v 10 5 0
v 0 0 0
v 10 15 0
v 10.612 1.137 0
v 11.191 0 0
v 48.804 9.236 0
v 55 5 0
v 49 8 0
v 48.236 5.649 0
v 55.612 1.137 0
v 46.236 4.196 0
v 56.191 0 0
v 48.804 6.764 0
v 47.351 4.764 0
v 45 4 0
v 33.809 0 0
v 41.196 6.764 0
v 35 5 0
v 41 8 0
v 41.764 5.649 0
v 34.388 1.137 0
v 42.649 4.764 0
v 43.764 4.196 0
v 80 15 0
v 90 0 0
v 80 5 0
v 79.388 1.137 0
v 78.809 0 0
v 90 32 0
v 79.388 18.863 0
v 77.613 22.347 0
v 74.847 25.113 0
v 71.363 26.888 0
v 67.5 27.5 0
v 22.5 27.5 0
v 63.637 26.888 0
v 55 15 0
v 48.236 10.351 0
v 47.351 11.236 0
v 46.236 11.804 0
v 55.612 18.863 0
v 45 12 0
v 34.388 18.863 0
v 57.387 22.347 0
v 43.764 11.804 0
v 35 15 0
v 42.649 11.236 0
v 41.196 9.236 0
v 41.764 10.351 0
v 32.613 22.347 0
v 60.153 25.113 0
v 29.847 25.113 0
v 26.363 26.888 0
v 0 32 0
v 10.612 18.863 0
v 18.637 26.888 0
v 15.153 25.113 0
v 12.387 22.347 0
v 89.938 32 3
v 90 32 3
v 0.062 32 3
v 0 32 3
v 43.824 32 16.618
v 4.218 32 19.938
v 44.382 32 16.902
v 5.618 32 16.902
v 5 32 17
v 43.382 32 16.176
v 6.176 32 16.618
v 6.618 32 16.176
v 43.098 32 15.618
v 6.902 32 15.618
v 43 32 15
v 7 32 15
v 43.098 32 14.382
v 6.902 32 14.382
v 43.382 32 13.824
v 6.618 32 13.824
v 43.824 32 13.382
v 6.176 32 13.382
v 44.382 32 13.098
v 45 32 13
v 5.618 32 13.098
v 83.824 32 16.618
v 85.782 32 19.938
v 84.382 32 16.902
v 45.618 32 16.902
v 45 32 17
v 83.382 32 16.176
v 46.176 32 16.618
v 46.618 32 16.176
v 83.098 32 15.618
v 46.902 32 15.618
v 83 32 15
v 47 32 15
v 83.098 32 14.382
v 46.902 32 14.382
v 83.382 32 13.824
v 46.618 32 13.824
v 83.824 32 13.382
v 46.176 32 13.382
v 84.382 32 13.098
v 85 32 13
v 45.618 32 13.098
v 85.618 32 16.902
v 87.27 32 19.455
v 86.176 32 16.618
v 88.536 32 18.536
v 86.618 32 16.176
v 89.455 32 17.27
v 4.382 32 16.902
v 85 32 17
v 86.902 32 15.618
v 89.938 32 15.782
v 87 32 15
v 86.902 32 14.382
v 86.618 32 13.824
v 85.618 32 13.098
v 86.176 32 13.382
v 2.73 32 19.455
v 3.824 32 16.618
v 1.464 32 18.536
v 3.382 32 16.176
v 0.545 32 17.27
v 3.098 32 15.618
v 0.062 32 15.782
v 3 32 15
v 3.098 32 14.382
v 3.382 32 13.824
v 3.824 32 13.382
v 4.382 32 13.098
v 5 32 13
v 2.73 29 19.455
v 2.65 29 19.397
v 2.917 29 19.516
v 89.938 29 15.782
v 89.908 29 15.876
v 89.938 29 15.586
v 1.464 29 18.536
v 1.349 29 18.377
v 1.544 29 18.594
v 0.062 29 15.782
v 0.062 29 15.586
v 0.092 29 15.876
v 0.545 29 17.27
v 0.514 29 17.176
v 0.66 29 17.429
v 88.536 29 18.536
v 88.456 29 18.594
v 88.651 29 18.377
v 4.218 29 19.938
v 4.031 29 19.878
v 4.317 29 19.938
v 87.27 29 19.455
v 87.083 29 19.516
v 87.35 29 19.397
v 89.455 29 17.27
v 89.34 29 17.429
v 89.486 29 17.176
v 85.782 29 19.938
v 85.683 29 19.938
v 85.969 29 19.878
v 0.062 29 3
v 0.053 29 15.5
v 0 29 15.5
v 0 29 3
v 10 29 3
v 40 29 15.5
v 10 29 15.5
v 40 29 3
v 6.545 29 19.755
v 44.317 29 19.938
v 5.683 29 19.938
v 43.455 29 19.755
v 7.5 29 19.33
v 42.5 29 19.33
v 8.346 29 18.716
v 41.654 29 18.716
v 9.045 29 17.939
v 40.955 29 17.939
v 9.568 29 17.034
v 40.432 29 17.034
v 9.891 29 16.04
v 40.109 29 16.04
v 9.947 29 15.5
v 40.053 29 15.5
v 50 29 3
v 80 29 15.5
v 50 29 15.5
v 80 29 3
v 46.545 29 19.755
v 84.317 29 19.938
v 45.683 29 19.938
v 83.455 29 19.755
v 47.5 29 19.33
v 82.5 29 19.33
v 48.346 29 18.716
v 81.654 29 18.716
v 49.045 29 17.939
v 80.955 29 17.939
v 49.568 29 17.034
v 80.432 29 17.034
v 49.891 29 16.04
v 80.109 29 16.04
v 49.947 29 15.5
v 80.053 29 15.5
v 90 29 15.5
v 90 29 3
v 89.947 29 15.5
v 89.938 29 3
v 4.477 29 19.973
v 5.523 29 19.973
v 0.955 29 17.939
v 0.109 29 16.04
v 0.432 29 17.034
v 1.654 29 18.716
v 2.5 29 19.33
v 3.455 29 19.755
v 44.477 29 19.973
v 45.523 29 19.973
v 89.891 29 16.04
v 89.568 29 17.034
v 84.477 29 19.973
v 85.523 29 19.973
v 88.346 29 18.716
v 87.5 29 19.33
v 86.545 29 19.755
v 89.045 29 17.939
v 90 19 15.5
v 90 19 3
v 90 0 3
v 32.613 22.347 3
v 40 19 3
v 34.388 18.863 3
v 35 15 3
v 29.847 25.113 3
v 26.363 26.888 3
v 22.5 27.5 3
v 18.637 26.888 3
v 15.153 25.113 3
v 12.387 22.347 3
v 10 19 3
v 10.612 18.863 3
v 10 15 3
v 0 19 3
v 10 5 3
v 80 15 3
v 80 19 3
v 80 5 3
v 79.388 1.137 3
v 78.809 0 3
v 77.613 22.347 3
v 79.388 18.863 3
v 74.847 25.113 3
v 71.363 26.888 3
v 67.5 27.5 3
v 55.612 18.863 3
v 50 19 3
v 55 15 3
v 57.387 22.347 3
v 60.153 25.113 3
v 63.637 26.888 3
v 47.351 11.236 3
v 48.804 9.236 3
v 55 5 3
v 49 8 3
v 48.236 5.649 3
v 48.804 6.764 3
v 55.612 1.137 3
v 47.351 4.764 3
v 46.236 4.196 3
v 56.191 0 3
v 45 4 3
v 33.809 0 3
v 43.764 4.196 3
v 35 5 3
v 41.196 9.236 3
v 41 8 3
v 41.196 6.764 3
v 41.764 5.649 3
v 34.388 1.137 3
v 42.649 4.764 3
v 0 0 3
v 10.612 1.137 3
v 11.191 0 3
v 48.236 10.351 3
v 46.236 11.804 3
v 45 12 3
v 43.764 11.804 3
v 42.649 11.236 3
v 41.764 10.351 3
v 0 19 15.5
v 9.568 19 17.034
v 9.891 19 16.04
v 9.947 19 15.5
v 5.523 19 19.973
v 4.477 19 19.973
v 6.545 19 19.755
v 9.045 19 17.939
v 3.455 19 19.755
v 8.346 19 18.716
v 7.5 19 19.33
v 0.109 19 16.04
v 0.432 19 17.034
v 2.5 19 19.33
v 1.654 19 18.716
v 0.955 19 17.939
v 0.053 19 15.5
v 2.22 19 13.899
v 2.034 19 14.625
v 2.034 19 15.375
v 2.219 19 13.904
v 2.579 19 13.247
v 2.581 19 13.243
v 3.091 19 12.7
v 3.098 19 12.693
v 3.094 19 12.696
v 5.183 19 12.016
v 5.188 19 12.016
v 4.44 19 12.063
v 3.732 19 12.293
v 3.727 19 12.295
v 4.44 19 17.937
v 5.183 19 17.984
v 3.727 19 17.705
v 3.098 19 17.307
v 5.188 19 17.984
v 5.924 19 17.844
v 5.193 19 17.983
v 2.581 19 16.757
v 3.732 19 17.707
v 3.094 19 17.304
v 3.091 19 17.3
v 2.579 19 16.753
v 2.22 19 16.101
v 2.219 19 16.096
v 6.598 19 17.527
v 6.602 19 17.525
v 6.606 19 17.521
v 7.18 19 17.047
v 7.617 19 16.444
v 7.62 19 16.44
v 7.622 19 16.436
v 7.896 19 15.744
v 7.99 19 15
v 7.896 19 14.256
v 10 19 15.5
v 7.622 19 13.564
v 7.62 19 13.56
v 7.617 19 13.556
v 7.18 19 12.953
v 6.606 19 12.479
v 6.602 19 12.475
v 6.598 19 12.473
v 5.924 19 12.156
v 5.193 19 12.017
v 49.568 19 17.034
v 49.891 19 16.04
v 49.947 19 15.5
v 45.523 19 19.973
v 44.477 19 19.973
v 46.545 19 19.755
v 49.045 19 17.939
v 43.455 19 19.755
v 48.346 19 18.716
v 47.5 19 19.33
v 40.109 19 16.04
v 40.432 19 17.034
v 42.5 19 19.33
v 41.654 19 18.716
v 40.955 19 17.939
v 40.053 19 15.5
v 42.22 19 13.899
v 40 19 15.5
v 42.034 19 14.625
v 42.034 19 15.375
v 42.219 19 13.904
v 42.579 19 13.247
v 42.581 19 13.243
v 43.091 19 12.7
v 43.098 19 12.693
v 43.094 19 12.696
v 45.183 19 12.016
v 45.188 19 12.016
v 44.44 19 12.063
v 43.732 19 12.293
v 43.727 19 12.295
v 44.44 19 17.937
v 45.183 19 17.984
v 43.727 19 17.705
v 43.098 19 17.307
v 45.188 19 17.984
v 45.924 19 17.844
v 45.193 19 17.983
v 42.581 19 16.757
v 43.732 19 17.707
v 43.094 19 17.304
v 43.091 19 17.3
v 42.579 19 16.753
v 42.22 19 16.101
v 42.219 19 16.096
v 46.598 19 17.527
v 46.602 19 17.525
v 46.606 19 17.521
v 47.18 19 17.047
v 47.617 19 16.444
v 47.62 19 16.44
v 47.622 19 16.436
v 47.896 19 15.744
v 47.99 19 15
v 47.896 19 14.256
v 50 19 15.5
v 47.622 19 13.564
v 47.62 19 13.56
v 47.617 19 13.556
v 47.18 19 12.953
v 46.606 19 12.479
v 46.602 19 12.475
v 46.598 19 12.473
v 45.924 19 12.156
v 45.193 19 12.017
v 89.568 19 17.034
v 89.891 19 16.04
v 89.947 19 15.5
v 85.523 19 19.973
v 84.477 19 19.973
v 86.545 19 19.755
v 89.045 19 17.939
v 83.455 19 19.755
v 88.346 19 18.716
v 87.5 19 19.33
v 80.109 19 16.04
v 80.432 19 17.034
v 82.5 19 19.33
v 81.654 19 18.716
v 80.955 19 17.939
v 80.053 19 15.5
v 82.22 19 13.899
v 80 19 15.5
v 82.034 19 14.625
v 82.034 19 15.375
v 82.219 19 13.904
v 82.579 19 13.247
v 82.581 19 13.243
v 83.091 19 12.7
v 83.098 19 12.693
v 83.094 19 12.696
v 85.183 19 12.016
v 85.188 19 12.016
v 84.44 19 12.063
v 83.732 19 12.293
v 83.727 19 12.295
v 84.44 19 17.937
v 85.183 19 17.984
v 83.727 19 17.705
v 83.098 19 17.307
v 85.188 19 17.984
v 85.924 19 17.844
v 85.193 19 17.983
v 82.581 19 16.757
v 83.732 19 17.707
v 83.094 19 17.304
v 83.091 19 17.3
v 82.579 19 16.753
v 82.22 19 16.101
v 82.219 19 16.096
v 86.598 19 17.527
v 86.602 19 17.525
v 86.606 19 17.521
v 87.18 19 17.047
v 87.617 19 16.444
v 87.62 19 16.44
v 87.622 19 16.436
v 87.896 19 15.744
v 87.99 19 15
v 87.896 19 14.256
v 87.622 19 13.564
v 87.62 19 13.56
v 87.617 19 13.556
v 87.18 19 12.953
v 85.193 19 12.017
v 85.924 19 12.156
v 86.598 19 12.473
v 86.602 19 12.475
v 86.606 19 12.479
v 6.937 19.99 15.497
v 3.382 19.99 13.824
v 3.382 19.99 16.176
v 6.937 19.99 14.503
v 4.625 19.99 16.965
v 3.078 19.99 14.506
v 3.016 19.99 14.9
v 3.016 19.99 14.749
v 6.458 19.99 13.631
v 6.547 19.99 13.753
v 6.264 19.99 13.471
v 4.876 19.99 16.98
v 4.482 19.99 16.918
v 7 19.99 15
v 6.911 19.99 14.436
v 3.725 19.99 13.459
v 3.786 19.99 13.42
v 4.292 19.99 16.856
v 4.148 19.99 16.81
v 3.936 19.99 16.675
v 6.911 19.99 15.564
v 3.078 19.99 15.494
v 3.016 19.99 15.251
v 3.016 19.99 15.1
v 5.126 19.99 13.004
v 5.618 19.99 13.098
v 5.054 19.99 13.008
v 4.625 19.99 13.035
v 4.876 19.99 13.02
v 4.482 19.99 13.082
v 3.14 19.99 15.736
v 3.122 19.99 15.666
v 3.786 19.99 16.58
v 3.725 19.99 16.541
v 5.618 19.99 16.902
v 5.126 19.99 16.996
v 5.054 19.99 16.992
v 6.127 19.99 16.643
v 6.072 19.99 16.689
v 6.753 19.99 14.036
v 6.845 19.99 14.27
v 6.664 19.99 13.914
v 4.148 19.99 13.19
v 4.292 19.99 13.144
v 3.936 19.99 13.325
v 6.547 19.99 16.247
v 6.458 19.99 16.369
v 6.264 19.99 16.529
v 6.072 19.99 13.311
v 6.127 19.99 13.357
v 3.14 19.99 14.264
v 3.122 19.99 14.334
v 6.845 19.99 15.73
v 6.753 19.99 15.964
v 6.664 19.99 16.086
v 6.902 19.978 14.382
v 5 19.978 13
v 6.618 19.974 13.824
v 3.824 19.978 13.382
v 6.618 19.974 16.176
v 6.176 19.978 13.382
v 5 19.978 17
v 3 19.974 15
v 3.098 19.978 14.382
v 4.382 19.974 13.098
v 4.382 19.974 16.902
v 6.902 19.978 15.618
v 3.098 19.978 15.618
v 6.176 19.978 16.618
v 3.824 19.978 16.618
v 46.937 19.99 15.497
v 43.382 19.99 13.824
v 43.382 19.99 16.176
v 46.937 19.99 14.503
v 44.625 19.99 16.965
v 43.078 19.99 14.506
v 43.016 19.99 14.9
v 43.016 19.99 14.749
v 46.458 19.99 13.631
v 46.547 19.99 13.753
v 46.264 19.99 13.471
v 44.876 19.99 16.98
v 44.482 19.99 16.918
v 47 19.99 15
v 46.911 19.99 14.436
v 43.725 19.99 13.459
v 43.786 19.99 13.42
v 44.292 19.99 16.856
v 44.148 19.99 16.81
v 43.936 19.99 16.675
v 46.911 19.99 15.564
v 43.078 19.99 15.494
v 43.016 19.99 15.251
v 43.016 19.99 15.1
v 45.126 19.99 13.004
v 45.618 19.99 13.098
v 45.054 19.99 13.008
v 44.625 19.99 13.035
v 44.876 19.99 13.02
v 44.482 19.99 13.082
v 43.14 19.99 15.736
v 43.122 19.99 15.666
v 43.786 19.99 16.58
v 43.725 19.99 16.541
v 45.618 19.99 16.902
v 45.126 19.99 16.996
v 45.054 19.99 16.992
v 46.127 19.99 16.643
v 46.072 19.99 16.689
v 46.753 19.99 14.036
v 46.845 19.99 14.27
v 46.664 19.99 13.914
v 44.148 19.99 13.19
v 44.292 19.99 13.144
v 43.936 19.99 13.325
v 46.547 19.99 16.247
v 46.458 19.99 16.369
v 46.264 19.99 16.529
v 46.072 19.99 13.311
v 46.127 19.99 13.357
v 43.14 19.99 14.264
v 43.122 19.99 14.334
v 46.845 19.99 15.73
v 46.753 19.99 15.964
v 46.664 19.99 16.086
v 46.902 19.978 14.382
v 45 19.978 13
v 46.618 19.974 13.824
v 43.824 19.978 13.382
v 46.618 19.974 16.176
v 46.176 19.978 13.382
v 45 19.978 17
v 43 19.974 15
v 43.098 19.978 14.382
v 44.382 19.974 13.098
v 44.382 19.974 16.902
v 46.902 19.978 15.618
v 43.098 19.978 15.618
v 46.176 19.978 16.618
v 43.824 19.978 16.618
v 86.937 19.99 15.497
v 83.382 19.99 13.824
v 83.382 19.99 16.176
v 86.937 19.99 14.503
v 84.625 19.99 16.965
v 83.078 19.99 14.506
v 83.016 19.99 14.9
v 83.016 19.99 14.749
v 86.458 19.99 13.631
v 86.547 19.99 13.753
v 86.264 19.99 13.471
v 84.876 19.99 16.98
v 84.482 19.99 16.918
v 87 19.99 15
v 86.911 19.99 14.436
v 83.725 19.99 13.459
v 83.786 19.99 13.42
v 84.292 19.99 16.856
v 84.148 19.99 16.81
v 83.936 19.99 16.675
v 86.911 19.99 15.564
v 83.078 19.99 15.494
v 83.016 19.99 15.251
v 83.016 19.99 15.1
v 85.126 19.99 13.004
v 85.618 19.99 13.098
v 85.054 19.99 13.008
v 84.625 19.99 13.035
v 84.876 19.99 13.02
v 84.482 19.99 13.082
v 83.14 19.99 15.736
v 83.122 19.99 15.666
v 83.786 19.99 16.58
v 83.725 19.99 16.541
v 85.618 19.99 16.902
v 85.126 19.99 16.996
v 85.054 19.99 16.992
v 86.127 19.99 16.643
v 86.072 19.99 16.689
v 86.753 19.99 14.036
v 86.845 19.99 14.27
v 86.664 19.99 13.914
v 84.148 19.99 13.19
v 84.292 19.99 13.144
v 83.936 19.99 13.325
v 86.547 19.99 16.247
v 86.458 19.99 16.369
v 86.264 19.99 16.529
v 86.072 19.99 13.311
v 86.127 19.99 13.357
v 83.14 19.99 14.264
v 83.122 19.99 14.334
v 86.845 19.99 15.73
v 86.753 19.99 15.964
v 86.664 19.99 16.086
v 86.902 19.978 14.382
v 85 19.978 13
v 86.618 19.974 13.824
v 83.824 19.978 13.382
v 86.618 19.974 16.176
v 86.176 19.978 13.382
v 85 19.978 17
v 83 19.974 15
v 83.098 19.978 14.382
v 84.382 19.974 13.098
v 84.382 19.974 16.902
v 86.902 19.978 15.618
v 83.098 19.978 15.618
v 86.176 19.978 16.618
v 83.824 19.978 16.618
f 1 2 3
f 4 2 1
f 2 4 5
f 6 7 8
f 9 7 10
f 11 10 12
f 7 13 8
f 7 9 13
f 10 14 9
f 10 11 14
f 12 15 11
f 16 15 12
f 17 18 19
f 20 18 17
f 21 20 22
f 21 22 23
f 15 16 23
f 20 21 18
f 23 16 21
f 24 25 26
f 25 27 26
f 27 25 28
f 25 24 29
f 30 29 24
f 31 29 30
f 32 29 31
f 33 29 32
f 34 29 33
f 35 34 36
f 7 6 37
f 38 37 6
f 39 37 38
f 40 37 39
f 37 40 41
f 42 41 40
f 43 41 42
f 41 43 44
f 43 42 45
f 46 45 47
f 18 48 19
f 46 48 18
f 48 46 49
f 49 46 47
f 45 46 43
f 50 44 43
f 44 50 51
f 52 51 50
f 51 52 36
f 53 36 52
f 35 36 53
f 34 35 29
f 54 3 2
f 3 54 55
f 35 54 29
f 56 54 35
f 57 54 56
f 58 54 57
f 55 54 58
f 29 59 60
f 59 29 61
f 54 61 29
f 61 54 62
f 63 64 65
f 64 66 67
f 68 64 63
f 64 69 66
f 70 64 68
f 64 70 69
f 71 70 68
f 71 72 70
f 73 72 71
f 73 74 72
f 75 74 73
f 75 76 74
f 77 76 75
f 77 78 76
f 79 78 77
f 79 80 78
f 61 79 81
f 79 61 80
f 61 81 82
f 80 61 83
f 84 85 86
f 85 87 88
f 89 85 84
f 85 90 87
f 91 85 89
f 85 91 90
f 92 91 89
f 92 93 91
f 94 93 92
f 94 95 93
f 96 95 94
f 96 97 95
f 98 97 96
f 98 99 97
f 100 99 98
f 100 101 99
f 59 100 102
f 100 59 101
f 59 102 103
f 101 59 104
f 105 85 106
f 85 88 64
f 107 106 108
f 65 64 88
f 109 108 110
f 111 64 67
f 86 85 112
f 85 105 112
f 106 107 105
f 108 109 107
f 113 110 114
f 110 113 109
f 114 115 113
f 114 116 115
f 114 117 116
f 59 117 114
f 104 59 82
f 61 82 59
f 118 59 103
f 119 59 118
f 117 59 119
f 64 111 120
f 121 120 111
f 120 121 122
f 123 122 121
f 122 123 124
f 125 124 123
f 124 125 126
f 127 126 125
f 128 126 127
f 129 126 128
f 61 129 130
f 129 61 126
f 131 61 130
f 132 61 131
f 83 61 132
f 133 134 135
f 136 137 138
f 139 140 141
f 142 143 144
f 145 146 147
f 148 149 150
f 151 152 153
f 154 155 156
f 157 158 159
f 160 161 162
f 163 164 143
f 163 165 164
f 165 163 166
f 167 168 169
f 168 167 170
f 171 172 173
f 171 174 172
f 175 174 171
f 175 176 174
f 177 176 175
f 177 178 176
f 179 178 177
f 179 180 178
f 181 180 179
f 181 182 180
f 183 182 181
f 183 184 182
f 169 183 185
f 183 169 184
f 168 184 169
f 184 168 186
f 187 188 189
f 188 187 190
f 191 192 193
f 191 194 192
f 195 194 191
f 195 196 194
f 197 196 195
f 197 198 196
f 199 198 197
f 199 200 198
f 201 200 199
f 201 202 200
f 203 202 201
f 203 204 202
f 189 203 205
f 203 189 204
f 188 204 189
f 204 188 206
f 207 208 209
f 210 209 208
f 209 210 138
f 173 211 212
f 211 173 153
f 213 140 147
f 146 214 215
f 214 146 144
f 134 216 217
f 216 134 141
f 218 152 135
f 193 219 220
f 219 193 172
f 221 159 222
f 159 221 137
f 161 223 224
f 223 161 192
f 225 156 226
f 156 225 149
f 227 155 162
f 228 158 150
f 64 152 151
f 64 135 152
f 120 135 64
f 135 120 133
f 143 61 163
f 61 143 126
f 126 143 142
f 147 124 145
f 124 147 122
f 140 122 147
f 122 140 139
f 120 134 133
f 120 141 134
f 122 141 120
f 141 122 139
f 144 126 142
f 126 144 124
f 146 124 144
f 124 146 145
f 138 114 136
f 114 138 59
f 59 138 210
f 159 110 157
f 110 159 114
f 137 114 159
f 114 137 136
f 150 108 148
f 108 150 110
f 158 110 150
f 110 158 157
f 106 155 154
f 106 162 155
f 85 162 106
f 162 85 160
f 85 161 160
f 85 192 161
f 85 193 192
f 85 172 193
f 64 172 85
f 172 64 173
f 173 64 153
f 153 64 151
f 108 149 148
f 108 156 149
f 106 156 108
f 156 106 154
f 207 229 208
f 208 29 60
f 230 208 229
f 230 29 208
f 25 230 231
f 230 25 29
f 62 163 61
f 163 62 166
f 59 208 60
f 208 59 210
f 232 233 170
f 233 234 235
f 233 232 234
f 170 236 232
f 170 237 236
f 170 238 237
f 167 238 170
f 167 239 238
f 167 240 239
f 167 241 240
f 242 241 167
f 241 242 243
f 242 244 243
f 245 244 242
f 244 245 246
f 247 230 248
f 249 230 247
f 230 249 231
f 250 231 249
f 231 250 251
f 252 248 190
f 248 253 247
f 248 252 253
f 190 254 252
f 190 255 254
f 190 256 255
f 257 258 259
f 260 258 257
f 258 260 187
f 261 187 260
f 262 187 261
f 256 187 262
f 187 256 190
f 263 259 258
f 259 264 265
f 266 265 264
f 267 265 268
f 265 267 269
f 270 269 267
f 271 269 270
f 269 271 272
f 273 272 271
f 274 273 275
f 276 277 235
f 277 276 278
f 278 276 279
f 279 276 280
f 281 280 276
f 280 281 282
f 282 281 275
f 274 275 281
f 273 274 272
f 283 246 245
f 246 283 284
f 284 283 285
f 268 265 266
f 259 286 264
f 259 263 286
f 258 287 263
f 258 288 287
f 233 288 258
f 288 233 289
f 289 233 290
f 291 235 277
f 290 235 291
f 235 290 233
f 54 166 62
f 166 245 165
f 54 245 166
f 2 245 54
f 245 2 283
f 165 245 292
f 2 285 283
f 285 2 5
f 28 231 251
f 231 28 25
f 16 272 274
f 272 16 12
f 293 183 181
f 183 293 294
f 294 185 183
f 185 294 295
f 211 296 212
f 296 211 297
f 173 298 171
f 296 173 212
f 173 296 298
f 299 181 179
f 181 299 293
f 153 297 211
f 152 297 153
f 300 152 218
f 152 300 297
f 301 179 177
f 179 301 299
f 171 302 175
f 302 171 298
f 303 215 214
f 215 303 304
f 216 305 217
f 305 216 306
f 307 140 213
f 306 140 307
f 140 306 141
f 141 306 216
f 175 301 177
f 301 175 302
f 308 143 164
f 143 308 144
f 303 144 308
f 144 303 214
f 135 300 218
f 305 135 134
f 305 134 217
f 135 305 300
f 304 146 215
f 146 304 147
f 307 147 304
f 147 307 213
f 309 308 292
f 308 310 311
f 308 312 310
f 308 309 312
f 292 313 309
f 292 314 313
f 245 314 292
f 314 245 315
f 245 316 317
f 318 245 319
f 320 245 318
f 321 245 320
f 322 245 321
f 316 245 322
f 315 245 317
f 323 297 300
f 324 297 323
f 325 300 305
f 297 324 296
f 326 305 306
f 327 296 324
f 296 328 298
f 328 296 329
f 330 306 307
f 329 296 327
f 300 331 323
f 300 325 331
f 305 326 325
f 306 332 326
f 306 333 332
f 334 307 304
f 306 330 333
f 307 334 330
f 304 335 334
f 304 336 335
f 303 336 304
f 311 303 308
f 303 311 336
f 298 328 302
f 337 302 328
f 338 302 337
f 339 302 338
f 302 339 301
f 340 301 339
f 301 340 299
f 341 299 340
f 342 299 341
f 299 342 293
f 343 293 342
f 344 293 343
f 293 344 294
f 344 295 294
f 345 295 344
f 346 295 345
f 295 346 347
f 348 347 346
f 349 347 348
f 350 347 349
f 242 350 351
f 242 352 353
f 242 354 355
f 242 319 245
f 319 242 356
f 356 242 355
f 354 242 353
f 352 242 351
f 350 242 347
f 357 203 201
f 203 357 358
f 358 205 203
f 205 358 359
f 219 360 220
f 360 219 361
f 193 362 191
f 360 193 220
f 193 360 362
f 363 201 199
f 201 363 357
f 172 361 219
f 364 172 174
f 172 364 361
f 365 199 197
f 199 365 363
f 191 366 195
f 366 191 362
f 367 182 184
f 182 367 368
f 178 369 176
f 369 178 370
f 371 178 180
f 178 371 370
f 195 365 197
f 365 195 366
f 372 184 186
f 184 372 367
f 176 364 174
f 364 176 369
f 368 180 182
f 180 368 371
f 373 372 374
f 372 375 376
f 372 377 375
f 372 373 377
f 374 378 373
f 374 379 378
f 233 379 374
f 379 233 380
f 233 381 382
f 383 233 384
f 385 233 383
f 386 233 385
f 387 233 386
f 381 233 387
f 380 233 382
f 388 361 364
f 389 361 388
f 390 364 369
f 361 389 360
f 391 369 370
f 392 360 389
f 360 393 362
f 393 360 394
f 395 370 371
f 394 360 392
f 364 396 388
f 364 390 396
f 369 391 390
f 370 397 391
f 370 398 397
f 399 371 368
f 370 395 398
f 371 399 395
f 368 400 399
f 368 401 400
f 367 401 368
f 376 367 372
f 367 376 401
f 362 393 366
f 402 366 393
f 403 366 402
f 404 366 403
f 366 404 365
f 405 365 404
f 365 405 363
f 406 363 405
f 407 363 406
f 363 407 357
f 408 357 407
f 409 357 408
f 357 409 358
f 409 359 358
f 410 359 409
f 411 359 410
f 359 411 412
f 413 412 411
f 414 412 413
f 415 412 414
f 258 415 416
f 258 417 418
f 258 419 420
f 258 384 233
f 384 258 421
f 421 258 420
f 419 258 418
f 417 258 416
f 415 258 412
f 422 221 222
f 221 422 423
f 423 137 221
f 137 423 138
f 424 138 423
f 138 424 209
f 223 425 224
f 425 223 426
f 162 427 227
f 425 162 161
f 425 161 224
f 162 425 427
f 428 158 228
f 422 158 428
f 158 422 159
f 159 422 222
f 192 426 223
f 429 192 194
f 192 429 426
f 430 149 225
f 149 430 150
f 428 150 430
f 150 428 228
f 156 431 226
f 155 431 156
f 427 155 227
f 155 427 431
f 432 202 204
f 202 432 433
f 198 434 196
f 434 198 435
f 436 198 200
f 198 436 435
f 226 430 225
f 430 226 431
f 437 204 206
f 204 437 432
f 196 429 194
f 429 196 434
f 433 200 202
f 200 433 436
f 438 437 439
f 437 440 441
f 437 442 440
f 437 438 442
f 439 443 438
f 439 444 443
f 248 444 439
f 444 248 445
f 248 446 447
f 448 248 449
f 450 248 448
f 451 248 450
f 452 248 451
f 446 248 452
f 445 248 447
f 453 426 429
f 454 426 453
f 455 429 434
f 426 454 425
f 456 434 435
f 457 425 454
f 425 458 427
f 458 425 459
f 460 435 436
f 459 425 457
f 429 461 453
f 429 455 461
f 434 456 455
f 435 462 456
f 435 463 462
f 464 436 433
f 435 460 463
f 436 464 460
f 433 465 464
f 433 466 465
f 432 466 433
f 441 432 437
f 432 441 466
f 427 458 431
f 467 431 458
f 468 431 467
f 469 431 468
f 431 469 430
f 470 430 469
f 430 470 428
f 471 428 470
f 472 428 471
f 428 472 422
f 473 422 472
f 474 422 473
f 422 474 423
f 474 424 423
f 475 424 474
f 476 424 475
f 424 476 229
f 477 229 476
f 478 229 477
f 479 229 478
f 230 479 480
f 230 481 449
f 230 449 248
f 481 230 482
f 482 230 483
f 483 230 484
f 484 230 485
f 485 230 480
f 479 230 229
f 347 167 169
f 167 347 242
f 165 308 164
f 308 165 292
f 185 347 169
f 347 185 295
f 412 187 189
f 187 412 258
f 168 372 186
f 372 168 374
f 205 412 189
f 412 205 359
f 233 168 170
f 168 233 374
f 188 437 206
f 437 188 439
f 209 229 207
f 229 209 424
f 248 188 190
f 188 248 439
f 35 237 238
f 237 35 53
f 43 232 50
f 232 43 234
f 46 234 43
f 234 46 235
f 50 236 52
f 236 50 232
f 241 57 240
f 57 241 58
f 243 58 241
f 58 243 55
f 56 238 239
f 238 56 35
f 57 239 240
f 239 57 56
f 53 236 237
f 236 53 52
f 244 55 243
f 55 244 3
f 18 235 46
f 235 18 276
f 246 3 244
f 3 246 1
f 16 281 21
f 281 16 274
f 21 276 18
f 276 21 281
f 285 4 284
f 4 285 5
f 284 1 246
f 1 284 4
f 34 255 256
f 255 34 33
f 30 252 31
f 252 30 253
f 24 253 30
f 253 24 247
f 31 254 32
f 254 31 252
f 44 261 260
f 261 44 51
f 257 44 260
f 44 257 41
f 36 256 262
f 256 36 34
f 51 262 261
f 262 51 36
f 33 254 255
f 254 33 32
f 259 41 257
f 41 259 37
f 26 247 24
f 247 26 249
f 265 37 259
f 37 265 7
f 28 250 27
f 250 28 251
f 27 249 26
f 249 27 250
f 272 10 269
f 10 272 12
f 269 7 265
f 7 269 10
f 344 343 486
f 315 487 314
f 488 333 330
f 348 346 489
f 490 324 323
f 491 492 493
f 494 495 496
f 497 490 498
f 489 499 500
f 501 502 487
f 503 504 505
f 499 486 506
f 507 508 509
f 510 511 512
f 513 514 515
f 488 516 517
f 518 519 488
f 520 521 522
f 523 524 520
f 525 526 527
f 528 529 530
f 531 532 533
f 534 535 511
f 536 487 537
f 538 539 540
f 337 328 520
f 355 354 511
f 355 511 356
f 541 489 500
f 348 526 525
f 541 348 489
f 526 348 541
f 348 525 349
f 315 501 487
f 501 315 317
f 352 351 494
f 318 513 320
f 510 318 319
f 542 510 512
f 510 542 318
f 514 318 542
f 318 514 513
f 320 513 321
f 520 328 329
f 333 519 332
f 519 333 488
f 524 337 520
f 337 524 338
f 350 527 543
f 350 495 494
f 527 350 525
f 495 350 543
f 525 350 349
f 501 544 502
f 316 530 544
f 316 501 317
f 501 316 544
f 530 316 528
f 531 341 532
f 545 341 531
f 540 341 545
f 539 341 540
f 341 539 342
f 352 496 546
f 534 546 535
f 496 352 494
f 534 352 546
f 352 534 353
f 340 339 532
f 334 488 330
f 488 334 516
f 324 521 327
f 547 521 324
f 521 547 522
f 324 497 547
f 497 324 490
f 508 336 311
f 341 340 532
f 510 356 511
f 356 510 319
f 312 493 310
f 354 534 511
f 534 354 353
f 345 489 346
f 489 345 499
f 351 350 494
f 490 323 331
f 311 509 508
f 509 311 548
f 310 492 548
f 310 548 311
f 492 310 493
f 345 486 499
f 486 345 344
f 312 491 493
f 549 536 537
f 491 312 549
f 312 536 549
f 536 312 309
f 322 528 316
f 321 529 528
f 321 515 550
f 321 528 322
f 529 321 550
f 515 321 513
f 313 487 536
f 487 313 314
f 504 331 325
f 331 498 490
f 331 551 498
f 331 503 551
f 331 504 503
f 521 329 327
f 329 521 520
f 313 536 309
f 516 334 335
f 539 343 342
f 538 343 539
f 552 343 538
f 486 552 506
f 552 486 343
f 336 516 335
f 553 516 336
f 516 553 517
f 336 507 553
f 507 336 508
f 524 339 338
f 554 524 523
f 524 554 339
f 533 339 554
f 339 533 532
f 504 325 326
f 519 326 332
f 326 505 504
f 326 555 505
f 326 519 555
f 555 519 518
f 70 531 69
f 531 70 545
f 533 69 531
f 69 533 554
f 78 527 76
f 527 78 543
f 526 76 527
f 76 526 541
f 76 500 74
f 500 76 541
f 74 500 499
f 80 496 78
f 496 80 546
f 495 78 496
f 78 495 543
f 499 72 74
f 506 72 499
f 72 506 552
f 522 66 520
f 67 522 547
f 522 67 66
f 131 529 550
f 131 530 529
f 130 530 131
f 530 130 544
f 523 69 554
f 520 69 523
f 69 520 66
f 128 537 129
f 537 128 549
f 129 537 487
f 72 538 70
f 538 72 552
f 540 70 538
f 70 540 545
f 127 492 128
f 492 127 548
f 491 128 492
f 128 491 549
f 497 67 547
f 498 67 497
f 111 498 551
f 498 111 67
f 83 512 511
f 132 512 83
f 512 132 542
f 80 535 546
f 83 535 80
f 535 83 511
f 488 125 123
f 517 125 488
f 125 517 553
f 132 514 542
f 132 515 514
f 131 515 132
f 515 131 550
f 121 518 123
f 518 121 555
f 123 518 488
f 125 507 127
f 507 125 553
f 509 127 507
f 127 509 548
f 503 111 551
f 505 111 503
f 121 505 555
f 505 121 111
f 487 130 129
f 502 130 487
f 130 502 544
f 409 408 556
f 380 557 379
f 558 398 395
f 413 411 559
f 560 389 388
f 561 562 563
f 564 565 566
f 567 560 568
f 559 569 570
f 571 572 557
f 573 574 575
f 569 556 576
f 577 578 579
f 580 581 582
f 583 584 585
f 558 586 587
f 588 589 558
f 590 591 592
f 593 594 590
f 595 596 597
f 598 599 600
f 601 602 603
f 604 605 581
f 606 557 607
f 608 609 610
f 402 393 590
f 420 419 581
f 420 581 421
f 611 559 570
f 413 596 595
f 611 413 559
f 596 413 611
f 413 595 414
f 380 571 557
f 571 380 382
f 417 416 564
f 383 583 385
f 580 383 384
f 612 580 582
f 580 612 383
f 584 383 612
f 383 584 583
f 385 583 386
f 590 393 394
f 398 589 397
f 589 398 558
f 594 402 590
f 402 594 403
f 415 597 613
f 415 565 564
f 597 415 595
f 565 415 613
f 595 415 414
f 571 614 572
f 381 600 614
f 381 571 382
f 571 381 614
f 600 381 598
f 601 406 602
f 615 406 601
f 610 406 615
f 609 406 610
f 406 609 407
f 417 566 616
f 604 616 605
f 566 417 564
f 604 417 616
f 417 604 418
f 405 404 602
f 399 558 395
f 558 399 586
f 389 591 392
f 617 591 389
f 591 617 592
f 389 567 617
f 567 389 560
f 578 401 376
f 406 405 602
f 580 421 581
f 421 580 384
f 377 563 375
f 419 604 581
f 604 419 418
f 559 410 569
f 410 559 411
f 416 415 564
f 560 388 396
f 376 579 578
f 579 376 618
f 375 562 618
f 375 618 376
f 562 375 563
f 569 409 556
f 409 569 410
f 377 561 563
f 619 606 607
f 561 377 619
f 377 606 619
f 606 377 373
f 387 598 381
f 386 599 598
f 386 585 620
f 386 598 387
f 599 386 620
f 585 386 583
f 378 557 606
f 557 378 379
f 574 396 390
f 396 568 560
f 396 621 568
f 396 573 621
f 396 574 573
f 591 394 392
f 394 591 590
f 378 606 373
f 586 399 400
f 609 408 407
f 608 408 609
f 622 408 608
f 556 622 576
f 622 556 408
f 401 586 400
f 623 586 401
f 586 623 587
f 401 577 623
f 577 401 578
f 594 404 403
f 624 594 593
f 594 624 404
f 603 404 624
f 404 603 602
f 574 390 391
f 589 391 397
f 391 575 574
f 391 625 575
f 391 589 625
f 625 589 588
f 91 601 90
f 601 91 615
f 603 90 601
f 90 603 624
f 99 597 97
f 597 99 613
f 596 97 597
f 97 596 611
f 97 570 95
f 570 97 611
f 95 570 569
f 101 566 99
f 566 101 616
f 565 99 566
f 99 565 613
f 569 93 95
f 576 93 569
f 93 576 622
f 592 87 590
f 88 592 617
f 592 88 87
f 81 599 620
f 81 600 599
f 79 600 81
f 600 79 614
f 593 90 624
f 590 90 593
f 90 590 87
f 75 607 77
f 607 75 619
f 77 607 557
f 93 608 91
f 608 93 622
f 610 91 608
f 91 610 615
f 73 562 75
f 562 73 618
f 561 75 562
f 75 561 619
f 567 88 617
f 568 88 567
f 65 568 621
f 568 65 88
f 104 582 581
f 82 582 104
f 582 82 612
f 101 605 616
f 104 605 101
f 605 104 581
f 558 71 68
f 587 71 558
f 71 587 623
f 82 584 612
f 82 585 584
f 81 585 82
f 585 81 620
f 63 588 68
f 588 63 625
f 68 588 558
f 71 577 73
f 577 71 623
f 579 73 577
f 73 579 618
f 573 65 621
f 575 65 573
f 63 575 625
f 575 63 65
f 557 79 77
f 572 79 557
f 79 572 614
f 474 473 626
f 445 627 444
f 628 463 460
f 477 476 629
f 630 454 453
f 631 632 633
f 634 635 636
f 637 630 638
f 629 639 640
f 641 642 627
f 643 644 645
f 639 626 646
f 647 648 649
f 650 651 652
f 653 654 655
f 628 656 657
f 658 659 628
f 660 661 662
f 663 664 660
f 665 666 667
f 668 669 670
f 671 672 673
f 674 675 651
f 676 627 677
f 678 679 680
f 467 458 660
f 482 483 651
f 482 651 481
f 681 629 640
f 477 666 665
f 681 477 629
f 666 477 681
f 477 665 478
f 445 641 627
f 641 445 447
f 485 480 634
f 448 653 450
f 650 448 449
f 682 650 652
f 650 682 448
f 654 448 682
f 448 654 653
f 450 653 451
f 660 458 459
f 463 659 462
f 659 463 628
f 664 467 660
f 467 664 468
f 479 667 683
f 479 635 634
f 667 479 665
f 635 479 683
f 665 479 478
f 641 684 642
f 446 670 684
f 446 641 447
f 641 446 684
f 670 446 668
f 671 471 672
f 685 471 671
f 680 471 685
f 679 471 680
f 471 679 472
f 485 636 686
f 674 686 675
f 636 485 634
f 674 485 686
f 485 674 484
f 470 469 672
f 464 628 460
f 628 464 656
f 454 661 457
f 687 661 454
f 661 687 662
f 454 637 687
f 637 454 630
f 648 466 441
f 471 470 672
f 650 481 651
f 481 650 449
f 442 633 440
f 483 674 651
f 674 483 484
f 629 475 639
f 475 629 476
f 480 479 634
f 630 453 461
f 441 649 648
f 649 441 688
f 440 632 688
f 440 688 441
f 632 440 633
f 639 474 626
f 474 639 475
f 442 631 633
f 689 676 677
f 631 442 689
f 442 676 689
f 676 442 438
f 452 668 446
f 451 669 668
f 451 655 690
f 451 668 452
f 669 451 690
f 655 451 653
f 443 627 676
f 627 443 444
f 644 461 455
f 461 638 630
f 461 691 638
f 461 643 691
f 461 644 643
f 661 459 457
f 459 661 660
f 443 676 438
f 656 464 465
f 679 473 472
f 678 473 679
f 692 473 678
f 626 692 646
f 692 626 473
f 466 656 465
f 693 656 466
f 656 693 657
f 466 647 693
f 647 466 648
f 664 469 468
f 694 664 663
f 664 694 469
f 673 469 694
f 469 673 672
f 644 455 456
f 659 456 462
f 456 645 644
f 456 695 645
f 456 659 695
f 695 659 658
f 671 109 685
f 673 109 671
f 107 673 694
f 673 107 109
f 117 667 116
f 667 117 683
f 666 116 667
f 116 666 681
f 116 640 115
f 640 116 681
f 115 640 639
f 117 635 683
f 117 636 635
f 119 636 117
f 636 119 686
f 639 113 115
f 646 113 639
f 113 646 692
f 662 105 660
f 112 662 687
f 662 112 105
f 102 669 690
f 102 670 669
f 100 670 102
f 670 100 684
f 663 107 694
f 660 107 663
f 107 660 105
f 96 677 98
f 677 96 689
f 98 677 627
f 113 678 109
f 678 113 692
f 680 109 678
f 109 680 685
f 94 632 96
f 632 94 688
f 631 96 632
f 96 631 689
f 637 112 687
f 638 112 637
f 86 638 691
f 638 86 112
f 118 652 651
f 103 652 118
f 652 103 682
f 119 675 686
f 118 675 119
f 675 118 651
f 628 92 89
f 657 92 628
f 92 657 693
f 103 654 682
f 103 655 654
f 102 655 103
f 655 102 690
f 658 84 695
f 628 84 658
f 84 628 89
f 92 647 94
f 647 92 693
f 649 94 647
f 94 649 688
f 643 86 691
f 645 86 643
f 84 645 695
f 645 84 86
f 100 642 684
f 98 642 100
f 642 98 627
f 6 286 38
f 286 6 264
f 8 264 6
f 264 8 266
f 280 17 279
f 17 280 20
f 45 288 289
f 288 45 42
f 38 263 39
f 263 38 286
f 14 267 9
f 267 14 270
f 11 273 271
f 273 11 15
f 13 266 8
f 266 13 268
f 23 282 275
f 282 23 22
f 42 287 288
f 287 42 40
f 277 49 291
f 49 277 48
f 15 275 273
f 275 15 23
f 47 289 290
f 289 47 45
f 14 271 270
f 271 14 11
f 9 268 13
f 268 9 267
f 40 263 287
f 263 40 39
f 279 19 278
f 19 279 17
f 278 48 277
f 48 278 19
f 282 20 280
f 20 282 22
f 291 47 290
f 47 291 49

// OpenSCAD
tw=90;
th=32;
sw=25;
difference(){
  union(){
    cube([tw,th,3]);
    translate([0,th-3,0]) {
      intersection(){
        cube([tw,3,20]);
        minkowski(){
          translate([5,0,0]) cube([tw-10,30,15]);
          sphere(5,$fn=20);
        }
      }
    }
    //translate([0,th-8,3]) cube([tw,5,5]);
    translate([5,th-3,15]) rotate([90,0,0]) cylinder(d=10,h=10,$fn=30);
    translate([tw/2,th-3,15]) rotate([90,0]) cylinder(d=10,h=10,$fn=30);
    translate([tw-5,th-3,15]) rotate([90,0]) cylinder(d=10,h=10,$fn=30);
    translate([0,th-13,3]) cube([10,10,12.5]);
    translate([tw/2-5,th-13,3]) cube([10,10,12.5]);
    translate([tw-10,th-13,3]) cube([10,10,12.5]);
  }
    translate([tw/2,8,-.01]) cylinder(d=8,h=5,$fn=20);
  //translate([-0.01,th-8,8]) rotate([0,90]) cylinder(d=10,h=tw+0.02,$fn=30);
  translate([tw/4,0]) scoop(d=sw,h=5);
  translate([tw*3/4,0]) scoop(d=sw,h=5);
  translate([5,th-13.01,15]) rotate([-90,0])  union(){ cylinder(d1=6,d2=4,h=1,$fn=25);cylinder(d=4,h=13.02,$fn=20);}
  translate([tw/2,th-13.01,15]) rotate([-90,0])  union(){ cylinder(d1=6,d2=4,h=1,$fn=25);cylinder(d=4,h=13.02,$fn=20);}
  translate([tw-5,th-13.01,15]) rotate([-90,0]) union(){ cylinder(d1=6,d2=4,h=1,$fn=25);
    cylinder(d=4,h=13.02,$fn=20);
  }
}
module scoop(d=15,h=3)
{
  translate([0,15,-0.01]) cylinder(d=d,h=h+.02,$fn=20);
  translate([-.5*d,5,-0.01]) cube([d,10,h+.02]);
  translate([0,5,-0.01]) cylinder(d=d,h=h+.02,$fn=20);
}
